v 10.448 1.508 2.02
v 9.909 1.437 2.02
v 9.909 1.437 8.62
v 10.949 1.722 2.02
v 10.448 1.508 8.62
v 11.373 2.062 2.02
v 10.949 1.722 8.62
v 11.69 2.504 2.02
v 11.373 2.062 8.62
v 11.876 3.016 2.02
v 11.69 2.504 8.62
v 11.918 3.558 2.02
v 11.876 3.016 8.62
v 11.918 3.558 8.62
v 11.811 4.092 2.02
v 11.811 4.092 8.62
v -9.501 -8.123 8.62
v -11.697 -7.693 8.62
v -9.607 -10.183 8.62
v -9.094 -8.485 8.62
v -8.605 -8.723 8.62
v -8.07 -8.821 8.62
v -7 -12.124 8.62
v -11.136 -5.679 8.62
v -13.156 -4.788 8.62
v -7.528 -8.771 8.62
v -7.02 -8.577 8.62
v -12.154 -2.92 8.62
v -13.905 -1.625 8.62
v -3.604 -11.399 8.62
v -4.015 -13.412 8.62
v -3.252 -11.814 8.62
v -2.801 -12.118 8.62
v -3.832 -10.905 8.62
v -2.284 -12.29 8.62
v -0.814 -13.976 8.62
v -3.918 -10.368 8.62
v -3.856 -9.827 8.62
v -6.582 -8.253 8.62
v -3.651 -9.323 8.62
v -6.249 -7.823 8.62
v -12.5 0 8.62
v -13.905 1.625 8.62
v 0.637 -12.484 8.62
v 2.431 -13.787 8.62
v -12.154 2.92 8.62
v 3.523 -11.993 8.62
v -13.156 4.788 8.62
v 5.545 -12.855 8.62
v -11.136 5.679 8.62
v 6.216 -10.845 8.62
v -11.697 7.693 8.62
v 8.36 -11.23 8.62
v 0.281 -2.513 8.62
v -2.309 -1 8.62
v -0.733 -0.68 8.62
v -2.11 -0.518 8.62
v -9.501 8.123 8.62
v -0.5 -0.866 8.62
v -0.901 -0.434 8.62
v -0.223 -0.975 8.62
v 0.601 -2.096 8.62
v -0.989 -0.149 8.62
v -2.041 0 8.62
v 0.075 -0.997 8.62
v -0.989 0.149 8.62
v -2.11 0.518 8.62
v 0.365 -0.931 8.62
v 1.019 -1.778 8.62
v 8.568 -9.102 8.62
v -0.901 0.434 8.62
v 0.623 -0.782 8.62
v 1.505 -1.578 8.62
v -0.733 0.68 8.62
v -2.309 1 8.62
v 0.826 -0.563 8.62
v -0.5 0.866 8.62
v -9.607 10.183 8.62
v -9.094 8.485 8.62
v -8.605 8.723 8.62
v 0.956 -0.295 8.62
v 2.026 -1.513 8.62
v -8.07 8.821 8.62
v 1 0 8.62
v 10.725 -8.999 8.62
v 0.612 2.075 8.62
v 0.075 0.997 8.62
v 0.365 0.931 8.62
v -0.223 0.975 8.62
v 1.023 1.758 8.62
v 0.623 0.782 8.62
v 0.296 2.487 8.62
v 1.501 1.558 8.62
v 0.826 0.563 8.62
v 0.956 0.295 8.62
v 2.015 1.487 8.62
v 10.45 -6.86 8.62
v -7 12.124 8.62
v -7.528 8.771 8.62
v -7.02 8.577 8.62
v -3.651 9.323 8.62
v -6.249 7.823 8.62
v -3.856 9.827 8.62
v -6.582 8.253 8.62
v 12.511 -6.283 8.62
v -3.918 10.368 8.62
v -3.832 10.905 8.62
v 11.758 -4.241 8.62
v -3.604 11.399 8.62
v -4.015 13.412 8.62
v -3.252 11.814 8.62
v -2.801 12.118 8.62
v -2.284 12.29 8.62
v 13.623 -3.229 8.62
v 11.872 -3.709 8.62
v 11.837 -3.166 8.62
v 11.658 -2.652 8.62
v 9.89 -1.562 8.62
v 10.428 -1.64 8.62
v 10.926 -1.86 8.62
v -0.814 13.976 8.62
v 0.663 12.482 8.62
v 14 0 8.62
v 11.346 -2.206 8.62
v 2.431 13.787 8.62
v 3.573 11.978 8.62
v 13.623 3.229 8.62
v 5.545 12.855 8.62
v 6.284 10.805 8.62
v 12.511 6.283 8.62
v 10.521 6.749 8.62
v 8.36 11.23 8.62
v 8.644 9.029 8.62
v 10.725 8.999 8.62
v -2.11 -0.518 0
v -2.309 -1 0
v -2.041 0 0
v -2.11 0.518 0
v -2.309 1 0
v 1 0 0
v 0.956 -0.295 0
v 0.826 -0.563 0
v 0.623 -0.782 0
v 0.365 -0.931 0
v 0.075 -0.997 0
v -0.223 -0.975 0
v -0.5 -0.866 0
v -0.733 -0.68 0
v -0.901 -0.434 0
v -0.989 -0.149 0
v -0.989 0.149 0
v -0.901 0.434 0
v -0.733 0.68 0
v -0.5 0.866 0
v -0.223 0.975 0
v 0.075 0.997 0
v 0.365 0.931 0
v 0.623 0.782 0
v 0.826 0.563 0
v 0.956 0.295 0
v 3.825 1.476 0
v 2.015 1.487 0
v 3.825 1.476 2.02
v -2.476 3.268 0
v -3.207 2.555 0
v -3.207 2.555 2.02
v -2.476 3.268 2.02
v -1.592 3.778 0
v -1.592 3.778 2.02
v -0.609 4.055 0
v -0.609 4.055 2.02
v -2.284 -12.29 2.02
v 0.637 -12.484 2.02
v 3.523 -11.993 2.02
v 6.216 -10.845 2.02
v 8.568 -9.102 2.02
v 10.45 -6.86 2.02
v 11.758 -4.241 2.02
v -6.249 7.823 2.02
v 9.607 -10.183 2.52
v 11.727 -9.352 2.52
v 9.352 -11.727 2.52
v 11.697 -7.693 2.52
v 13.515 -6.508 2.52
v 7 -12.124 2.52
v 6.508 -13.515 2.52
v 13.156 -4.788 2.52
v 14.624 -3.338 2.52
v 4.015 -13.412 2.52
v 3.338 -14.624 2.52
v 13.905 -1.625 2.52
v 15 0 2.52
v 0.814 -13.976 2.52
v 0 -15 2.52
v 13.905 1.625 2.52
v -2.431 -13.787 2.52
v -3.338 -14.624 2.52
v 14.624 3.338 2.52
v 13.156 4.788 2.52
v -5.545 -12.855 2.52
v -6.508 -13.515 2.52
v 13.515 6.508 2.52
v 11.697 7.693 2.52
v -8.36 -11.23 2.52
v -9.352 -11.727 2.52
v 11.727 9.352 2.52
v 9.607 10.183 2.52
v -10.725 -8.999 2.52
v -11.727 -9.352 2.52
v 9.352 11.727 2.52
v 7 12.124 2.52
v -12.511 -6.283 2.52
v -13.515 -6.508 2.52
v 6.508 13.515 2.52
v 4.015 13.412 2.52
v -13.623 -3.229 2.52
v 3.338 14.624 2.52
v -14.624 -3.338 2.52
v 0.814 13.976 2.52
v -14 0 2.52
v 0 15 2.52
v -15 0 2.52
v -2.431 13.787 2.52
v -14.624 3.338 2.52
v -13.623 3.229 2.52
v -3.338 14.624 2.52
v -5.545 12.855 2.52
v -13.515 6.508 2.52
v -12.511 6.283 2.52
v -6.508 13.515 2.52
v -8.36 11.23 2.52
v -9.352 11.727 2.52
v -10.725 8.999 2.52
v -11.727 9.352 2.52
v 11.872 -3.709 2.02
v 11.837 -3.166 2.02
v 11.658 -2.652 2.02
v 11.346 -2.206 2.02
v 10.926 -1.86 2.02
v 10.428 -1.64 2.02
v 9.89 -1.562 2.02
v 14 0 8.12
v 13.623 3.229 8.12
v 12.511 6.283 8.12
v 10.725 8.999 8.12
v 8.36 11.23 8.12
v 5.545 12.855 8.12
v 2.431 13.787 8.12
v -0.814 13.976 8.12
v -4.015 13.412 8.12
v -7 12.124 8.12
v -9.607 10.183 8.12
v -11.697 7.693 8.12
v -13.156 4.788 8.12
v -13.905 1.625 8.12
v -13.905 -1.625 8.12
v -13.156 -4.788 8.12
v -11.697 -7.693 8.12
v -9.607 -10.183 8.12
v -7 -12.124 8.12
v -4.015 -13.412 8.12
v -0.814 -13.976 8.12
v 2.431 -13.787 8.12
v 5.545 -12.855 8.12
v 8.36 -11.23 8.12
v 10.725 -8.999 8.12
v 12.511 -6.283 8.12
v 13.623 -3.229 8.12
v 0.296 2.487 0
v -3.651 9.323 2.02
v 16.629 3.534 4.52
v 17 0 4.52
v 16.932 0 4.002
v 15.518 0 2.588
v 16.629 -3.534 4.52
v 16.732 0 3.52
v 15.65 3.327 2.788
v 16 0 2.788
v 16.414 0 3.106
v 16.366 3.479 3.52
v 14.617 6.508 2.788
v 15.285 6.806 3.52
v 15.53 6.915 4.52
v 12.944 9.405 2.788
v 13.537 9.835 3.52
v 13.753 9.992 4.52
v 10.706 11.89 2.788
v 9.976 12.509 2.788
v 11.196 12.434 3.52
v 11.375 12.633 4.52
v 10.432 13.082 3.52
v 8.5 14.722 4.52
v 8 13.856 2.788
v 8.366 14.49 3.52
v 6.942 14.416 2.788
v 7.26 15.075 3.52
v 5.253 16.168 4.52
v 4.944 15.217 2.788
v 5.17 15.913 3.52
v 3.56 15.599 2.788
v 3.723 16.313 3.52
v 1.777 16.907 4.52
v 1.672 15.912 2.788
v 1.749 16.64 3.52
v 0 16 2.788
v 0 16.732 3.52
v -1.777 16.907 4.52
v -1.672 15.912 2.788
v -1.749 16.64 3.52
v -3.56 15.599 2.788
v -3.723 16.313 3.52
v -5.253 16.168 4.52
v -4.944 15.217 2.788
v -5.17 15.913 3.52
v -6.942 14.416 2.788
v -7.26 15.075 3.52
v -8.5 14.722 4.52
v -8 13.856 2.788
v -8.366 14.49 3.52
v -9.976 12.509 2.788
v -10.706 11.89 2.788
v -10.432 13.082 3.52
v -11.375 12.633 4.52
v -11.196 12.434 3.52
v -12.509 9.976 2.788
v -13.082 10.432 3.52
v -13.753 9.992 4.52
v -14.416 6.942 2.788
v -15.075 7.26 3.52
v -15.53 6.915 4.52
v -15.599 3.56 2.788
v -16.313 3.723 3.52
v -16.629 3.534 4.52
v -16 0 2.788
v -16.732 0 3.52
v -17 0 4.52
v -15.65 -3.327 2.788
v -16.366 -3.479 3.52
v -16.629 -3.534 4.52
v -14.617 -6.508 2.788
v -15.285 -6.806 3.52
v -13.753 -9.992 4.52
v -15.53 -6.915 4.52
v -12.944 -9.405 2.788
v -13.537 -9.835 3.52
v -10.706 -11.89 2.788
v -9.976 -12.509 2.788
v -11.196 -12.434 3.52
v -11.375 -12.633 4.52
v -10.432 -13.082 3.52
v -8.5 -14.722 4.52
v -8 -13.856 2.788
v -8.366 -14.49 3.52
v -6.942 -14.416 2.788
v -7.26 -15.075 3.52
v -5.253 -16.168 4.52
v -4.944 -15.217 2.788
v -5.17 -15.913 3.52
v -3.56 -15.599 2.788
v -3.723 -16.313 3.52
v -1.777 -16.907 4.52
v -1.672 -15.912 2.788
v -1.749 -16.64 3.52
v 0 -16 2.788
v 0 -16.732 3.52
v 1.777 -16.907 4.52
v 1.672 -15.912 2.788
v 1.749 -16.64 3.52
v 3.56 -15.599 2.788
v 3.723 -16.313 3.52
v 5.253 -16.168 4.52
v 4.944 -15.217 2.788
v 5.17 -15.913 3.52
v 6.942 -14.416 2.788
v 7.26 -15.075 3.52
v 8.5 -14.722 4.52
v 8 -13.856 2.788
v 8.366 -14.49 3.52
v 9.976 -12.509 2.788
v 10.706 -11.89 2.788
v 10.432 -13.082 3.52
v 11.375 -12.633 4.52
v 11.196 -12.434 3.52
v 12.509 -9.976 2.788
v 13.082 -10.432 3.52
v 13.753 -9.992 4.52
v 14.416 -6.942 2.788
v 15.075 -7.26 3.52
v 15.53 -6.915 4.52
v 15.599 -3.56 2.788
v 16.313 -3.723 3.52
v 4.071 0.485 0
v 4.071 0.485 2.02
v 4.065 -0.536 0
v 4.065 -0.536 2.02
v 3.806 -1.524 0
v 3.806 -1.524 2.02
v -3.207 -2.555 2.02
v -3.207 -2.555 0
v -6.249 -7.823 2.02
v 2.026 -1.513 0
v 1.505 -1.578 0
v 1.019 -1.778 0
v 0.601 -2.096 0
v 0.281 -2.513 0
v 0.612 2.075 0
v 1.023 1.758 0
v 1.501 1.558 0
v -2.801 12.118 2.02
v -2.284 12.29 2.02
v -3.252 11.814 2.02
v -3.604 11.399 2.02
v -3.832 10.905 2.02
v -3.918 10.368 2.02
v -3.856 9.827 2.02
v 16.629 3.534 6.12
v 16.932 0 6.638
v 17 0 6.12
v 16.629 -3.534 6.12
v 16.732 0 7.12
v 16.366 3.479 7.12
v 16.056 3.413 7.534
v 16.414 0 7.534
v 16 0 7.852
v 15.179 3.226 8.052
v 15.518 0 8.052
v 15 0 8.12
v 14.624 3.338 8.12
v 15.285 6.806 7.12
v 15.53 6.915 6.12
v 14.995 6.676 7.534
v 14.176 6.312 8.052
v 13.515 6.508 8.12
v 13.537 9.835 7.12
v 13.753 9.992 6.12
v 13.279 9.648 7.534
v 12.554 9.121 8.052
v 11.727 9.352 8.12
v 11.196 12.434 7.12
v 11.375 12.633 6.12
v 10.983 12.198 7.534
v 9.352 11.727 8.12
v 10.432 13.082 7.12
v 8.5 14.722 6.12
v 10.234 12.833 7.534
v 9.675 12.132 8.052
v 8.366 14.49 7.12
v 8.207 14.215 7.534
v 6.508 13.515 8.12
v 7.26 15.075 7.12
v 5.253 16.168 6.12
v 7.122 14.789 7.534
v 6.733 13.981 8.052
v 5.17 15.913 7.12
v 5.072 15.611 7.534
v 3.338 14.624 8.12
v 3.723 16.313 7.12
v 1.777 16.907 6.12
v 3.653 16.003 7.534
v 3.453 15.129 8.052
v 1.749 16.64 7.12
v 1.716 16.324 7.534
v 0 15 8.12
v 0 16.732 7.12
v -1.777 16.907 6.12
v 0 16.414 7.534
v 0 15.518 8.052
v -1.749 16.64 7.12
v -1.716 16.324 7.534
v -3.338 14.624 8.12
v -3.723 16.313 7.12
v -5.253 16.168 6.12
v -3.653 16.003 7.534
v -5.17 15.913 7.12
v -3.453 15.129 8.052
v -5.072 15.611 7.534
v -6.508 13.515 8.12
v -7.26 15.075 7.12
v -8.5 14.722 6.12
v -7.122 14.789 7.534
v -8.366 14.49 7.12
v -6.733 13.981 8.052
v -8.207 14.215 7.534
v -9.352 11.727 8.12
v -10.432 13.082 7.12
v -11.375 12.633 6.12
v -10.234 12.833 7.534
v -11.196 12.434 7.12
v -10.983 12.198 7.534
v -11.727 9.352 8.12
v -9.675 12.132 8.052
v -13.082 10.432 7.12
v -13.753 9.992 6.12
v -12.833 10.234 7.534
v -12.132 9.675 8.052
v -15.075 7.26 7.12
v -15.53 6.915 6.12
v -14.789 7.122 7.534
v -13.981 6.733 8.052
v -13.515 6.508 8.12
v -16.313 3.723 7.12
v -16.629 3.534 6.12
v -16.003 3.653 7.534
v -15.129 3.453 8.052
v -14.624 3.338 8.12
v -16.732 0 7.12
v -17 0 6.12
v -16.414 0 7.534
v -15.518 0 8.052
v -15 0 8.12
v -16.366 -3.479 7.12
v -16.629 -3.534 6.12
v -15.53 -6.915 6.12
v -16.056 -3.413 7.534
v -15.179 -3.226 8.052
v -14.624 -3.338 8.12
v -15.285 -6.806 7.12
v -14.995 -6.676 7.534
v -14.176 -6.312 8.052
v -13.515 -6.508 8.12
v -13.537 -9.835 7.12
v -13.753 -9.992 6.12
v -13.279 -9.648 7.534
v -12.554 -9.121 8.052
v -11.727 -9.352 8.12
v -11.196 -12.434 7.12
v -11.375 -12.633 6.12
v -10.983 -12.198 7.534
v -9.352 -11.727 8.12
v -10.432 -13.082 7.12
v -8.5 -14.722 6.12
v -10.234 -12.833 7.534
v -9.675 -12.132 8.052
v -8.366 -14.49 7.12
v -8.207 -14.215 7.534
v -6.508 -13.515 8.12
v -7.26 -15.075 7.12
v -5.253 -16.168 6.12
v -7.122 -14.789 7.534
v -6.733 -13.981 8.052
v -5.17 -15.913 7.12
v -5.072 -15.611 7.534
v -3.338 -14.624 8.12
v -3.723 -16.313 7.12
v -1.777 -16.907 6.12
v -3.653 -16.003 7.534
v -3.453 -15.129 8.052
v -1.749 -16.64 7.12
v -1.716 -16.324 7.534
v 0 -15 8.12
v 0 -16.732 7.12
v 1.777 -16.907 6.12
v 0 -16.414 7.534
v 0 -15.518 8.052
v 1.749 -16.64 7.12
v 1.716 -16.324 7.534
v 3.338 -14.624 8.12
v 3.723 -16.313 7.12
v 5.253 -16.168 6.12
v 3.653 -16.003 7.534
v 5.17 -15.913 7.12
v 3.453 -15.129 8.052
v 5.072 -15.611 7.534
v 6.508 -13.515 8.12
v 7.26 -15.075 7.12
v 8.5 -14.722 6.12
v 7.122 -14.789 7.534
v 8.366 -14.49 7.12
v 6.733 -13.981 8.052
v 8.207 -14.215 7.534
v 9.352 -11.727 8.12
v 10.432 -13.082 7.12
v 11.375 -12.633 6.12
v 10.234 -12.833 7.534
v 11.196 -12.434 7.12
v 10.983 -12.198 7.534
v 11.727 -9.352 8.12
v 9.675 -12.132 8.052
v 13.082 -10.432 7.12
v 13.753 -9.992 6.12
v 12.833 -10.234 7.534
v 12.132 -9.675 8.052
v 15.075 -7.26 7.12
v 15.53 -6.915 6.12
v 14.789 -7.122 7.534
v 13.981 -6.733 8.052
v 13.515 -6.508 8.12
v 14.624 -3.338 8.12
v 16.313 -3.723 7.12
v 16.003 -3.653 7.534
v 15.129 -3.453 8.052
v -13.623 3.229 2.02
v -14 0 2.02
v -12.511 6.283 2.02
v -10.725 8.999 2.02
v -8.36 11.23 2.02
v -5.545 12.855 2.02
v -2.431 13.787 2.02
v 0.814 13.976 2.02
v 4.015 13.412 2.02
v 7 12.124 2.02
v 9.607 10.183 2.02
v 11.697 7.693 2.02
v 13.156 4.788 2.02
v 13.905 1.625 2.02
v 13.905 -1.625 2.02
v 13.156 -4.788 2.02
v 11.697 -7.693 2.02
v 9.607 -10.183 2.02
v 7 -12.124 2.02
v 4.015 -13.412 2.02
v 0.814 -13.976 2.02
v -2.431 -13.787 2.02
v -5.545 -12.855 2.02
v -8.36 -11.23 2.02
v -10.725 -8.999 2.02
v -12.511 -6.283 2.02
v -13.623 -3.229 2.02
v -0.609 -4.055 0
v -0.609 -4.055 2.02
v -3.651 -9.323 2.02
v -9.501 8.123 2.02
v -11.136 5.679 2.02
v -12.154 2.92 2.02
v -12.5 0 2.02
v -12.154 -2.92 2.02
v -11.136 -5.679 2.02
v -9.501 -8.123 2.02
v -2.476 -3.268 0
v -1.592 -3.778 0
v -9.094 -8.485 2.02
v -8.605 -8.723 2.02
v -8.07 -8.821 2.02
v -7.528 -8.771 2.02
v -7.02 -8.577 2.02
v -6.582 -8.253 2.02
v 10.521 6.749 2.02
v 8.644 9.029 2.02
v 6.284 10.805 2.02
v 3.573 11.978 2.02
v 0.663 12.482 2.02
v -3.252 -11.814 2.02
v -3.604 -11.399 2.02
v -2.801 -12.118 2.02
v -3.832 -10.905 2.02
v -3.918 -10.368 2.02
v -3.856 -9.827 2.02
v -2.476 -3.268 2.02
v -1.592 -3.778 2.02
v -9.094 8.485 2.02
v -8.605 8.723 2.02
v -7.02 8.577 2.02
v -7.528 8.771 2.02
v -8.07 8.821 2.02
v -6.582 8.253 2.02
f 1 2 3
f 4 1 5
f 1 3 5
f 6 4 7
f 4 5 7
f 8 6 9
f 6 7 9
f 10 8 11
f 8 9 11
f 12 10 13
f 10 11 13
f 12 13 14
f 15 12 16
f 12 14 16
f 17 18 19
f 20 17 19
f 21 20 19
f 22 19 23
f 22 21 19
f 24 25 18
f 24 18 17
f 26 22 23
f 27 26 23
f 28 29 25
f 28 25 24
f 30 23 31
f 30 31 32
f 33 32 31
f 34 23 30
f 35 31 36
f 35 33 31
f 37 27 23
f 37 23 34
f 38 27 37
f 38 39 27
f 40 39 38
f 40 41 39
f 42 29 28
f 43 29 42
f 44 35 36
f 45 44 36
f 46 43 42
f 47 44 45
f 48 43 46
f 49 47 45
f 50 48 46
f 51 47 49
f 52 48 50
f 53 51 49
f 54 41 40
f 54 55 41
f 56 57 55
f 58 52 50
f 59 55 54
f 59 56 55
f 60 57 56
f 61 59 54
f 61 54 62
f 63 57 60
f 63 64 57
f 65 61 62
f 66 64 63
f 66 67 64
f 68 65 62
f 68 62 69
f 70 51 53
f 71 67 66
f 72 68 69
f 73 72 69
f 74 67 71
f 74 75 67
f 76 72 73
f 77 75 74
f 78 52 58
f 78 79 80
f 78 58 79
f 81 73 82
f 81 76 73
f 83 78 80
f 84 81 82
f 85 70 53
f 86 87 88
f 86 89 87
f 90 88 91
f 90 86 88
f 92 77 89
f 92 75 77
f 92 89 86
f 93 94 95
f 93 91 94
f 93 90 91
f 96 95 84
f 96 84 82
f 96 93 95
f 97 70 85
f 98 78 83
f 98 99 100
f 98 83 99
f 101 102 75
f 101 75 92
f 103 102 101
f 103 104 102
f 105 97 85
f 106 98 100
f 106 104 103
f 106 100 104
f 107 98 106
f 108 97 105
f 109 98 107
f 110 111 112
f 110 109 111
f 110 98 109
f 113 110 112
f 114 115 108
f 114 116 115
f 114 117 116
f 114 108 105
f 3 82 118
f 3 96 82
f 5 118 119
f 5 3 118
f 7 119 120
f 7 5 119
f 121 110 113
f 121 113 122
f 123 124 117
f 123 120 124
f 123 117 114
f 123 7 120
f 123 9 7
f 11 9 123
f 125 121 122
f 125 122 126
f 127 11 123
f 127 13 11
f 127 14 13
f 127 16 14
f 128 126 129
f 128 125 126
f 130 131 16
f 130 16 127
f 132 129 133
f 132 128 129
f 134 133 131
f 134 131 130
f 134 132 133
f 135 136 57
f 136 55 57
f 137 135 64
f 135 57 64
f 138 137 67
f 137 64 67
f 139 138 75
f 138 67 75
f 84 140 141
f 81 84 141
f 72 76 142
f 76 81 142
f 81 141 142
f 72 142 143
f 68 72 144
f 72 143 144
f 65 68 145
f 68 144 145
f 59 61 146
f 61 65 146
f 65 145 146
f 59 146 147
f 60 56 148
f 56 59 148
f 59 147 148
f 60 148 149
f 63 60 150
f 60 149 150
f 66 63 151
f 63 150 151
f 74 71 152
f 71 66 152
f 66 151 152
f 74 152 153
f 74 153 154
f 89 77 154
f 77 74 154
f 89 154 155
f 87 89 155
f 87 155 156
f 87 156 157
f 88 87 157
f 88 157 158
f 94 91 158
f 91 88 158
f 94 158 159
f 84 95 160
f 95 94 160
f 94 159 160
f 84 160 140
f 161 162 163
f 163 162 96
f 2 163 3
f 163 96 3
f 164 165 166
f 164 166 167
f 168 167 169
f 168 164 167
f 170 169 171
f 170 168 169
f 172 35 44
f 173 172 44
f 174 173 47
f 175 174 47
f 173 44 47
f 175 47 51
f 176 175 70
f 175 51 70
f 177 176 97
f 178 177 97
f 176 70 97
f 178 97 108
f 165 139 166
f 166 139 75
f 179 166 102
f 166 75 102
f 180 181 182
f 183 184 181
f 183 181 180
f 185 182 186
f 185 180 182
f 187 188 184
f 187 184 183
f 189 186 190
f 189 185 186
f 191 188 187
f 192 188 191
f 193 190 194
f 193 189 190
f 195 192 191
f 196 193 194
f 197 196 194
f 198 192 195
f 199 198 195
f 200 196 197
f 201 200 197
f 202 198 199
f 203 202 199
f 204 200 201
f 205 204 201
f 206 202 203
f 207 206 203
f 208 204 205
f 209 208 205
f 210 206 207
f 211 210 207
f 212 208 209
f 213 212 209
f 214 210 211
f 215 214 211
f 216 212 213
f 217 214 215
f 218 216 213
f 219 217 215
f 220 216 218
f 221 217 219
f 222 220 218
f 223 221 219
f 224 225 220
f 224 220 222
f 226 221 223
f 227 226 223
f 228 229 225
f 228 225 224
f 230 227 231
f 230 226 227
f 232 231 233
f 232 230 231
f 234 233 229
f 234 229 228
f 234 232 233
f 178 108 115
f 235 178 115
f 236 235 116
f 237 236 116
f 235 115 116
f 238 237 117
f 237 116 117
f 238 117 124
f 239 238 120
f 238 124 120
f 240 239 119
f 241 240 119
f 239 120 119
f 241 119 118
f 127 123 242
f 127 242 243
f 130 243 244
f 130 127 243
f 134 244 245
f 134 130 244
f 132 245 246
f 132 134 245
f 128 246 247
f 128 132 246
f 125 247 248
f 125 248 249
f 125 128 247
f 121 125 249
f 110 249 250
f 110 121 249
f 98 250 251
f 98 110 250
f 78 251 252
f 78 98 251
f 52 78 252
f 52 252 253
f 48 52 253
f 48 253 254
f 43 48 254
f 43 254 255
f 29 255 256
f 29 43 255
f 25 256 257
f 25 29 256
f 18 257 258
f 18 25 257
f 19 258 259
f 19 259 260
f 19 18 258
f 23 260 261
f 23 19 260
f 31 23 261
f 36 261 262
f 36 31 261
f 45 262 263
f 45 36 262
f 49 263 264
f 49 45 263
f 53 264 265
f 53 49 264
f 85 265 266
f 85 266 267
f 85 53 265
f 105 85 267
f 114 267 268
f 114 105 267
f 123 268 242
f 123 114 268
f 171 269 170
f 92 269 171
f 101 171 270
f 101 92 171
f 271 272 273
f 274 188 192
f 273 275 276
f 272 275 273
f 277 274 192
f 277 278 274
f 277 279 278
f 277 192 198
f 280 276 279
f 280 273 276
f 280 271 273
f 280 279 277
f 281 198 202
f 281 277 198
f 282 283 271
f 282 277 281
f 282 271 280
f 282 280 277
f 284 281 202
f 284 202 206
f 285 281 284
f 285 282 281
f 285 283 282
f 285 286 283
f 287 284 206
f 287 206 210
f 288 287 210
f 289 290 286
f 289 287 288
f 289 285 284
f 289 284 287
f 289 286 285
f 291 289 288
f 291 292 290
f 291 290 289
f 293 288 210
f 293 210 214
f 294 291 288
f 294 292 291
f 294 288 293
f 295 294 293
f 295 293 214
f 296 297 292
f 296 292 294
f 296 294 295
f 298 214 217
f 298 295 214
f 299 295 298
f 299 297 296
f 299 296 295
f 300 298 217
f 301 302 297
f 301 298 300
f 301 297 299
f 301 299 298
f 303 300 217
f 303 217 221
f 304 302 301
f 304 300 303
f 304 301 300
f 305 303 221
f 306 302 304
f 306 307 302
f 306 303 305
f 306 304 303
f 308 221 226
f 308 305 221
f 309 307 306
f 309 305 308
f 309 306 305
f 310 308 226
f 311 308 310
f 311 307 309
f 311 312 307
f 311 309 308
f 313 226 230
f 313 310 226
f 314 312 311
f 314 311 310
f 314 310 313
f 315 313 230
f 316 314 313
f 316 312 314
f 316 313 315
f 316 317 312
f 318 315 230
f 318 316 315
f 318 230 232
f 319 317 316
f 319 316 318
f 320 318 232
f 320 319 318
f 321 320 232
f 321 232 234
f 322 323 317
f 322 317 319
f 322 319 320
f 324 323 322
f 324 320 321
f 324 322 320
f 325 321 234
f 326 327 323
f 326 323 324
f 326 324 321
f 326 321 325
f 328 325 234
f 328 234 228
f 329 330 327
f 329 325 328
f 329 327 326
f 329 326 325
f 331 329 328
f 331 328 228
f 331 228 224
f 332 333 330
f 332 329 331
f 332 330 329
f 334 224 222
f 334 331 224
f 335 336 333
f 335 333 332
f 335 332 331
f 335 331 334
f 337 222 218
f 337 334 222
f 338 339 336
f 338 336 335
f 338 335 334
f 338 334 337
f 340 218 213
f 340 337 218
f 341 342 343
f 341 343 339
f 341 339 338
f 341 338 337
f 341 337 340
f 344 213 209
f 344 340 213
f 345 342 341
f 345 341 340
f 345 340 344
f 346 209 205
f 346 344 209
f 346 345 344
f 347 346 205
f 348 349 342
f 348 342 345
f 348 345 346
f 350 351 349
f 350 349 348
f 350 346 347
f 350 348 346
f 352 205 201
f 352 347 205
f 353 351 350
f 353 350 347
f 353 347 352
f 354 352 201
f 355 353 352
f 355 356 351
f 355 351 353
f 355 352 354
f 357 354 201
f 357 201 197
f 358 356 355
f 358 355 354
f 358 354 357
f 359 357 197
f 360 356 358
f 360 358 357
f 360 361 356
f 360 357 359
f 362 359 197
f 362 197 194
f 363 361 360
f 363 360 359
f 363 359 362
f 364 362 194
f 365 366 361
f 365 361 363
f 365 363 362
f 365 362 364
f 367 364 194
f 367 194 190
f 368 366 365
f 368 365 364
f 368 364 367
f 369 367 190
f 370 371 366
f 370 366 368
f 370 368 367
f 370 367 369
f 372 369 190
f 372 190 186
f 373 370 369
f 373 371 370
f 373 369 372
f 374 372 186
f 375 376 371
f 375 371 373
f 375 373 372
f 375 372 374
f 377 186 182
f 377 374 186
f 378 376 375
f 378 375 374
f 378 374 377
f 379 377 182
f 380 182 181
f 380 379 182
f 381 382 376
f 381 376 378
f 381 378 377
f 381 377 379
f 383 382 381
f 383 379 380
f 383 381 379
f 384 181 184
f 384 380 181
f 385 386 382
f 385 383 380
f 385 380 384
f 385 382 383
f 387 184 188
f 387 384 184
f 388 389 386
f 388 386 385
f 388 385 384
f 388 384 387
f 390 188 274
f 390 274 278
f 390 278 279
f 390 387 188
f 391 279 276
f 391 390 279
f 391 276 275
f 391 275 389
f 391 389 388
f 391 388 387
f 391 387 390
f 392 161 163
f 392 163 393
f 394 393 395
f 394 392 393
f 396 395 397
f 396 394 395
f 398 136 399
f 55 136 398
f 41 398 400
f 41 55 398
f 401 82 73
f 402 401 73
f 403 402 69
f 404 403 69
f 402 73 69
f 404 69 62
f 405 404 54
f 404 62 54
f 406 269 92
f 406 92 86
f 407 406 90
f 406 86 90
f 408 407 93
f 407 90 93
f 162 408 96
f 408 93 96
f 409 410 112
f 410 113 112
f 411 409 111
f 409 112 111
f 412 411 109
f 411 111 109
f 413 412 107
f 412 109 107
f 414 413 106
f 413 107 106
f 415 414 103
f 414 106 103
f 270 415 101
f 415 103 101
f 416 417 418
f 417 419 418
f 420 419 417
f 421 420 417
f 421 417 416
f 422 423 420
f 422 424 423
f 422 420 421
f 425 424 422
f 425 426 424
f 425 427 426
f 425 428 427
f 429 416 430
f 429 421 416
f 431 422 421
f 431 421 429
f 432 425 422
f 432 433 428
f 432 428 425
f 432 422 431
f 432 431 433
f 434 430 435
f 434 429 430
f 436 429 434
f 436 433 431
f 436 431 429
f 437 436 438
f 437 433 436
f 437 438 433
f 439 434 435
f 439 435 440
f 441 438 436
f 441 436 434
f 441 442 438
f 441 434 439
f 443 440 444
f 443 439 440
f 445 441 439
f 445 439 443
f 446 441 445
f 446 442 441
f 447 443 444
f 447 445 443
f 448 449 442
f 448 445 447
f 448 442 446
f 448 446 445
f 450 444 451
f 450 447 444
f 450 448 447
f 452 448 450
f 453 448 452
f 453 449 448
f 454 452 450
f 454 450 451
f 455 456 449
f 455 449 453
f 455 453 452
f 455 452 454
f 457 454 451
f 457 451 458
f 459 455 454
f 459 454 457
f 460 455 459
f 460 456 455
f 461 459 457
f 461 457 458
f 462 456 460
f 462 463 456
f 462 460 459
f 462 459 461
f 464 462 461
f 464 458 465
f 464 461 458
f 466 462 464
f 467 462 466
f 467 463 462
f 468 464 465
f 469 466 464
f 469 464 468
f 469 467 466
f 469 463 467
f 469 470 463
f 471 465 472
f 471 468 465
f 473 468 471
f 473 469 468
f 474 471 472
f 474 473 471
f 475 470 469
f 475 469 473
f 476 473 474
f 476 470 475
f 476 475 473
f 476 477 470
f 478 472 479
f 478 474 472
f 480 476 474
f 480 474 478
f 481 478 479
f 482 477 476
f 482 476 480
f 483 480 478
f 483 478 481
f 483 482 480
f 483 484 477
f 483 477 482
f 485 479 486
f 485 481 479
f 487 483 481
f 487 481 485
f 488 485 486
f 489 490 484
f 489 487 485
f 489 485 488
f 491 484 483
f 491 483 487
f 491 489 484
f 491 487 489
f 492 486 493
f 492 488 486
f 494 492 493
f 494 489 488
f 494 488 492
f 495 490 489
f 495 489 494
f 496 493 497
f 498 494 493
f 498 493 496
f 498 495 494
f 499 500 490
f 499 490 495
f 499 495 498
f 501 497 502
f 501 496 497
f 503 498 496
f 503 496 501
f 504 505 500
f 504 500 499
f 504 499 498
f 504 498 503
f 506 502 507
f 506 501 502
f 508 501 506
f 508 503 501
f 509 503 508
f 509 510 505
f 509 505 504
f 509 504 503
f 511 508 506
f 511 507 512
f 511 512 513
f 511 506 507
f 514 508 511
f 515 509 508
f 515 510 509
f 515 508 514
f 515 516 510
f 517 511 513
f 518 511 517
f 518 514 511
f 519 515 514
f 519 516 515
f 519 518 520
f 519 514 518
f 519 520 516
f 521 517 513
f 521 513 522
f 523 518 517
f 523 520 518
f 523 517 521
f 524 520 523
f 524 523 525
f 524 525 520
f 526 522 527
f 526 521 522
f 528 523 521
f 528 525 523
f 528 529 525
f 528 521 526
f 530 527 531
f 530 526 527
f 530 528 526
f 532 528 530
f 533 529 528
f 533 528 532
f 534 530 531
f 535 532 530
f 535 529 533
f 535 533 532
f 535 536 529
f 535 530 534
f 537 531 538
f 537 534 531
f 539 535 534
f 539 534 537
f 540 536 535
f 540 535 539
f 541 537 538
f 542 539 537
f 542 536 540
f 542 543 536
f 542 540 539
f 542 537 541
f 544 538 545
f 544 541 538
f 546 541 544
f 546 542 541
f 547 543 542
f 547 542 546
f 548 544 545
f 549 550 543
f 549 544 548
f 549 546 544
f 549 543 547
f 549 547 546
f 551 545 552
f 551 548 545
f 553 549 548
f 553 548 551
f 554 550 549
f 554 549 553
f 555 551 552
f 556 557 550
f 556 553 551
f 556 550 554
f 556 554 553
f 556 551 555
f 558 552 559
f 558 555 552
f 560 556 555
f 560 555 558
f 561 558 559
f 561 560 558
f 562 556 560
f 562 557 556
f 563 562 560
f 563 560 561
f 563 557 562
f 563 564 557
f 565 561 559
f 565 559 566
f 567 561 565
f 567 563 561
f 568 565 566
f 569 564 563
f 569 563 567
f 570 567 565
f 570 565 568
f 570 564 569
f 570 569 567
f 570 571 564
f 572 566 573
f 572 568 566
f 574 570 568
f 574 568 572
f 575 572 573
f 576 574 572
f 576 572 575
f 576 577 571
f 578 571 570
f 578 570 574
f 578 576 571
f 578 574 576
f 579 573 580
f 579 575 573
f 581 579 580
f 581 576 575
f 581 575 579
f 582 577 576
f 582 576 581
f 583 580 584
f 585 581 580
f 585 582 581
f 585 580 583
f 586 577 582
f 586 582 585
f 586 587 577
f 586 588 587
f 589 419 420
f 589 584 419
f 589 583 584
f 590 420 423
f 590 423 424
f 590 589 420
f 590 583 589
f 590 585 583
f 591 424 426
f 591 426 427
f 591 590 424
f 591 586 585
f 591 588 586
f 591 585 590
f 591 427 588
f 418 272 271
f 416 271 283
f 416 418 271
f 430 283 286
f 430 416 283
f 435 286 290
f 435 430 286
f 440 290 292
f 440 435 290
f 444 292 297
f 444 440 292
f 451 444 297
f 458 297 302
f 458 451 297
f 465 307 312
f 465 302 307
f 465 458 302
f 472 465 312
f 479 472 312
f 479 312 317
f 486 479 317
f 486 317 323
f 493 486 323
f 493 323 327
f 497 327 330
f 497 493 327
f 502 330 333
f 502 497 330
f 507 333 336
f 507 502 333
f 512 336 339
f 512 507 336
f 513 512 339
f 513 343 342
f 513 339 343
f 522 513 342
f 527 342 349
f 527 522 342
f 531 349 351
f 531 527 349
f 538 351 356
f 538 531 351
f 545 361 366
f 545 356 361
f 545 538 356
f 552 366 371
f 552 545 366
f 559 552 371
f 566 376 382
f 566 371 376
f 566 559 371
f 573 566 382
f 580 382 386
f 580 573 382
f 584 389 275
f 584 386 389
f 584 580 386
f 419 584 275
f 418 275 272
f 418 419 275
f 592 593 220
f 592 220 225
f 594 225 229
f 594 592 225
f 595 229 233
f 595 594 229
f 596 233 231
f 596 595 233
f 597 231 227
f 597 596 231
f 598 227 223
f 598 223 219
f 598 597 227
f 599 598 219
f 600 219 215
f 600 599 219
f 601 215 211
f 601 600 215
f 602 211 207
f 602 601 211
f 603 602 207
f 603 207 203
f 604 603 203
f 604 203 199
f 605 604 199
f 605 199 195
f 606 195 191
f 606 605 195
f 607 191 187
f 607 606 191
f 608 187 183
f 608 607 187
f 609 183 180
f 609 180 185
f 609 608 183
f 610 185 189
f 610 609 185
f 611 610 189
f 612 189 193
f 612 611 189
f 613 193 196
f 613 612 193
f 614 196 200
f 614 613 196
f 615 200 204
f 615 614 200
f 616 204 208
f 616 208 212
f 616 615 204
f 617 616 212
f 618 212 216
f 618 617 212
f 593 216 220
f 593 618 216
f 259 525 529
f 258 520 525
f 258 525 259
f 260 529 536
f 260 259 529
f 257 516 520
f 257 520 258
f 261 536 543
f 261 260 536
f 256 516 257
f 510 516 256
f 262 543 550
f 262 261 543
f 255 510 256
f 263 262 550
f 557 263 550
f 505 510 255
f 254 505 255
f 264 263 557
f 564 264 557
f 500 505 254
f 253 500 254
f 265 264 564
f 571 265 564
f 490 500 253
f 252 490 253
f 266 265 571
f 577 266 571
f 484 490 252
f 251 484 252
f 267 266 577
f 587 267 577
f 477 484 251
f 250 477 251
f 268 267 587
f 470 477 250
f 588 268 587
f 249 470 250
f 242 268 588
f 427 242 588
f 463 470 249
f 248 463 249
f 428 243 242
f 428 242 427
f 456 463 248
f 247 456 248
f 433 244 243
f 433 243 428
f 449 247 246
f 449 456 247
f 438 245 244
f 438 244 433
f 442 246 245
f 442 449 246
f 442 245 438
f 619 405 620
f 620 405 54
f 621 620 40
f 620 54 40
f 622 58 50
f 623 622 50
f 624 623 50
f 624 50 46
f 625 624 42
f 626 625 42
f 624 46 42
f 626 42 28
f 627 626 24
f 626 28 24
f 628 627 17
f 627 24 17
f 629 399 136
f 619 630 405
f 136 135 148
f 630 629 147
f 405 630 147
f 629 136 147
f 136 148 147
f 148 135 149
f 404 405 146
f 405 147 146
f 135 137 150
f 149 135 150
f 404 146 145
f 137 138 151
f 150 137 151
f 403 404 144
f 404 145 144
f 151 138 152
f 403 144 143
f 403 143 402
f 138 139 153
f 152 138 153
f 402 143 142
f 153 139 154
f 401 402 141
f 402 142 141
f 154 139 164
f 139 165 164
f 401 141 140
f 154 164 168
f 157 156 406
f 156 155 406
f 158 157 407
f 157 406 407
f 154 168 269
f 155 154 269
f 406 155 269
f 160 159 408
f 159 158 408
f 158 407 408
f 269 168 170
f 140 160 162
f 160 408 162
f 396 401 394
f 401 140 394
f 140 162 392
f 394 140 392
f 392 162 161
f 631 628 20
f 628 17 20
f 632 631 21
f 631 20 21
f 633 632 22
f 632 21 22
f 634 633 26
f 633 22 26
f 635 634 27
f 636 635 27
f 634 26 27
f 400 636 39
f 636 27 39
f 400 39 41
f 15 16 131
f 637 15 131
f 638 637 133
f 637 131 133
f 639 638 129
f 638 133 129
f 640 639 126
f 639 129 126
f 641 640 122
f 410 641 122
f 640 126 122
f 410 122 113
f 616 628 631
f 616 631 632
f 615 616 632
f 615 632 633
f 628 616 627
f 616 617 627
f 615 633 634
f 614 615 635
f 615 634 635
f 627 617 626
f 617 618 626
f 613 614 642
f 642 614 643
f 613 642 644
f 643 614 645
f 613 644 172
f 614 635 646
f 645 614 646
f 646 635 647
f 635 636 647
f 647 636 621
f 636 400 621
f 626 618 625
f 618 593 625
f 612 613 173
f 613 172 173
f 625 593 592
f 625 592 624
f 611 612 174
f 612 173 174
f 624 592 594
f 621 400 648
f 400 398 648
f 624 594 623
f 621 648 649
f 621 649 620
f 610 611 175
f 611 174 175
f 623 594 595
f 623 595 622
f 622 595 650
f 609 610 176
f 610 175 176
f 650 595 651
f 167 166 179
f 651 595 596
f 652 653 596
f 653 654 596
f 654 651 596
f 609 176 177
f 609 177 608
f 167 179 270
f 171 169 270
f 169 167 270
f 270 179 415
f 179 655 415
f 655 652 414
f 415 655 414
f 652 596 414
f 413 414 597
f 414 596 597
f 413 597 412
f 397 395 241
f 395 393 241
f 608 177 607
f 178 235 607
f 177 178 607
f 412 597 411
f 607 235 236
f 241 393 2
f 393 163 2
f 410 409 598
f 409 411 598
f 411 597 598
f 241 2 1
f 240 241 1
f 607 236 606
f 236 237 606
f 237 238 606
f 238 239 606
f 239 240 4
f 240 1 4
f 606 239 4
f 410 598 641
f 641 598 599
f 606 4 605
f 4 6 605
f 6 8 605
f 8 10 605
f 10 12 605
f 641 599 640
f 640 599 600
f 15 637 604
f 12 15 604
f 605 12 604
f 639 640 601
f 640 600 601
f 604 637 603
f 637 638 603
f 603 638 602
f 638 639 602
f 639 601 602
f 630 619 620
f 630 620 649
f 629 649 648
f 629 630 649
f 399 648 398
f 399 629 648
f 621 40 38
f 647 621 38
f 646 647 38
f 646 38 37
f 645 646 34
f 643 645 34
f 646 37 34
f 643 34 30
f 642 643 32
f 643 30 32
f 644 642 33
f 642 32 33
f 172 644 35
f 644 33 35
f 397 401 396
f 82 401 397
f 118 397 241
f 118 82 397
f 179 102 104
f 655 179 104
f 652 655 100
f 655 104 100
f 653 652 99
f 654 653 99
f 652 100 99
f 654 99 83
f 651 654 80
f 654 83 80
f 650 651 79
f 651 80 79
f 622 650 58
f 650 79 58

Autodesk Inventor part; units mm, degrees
ref_plane "YZ Plane" through (0, 0, 0) normal (1, 0, 0) x (0, 1, 0)
ref_plane "XZ Plane" through (0, 0, 0) normal (0, 1, 0) x (-1, 0, 0)
ref_plane "XY Plane" through (0, 0, 0) normal (0, 0, 1) x (1, 0, 0)
sketch "스케치1" plane through (0, 0, 0) normal (0, 0, 1) x (1, 0, 0)
  circle A0 centre (0, 0) radius 4.1
  circle A1 centre (0, 0) radius 1 projected
  dimension "d0" = 8.2
extrude "돌출1" add sketch "스케치1" along normal blind 8.62
sketch "스케치2" plane through (0, 0, 8.62) normal (0, 0, 1) x (1, 0, 0)
  circle A0 centre (0, 0) radius 17
  circle A1 centre (0, 0) radius 4.1 projected
  dimension "d3" = 34
extrude "돌출2" add sketch "스케치2" against normal blind 6.6
sketch "스케치3" plane through (0, 0, 8.62) normal (0, 0, 1) x (1, 0, 0)
  point P0 (0, 0)
sketch "스케치4" plane through (0, 0, 8.62) normal (0, 0, 1) x (1, 0, 0)
  circle A0 centre (0, 0) radius 17 projected
  circle A1 centre (0, 0) radius 1 projected
  circle A2 centre (0, 0) radius 14
  dimension "d6" = 3
extrude "돌출3" cut sketch "스케치4" against normal blind 0.5 contours A0
sketch "스케치5" plane through (0, 0, 2.02) normal (0, 0, -1) x (-1, 0, 0)
  circle A0 centre (0, 0) radius 4.1 projected
  circle A1 centre (0, 0) radius 17 projected
  circle A2 centre (0, 0) radius 14 projected
extrude "돌출4" cut sketch "스케치5" against normal blind 0.5 contours A1
fillet "모깎기1" radius 2 2 edges at (-17, 0, 2.52) (-17, 0, 8.12)
sketch "스케치6" plane through (0, 0, 8.62) normal (0, 0, 1) x (1, 0, 0)
  circle A0 centre (0, 0) radius 14 projected
  circle A1 centre (0, 0) radius 1 projected
  circle A2 centre (0, 0) radius 14
  circle A3 centre (0, 0) radius 14 projected
  line L0 (0, 0) -> (1, 0) construction
  line L1 (0, 0) -> (-0.5, -0.866)
  line L2 (2.026, -1.5128) -> (9.8898, -1.5625)
  line L3 (0.866, -1.5) -> (0.8629, -1.5055)
  line L4 (-2.3094, -1) -> (-6.2488, -7.8232)
  line L5 (13.9097, -1.5879) -> (13.9902, -1.5884)
  line L6 (0.296, 2.4873) -> (-3.6507, 9.3232)
  line L7 (-2.3094, 1) -> (-6.2488, 7.8232)
  line L8 (-8.2587, 11.3046) -> (-8.299, 11.3744)
  line L9 (-5.6607, 12.8046) -> (-5.701, 12.8744)
  arc A4 (-2.2841, -12.2895) -> (11.7585, -4.2411) centre (0, 0) ccw
  line L10 (0, 0) -> (1, -0.0063)
  line L11 (0.2813, -2.5128) -> (-3.6507, -9.3232)
  line L12 (-5.6607, -12.8046) -> (-5.701, -12.8744)
  line L13 (0, 0) -> (-0.5, 0.866)
  line L14 (2.0154, 1.4873) -> (9.9088, 1.4374)
  line L15 (13.9286, 1.412) -> (14.0092, 1.4115)
  arc A5 (11.8112, 4.0921) -> (-2.2841, 12.2895) centre (0, 0) ccw
  arc A6 (-9.501, 8.1229) -> (-9.501, -8.1229) centre (0, 0) ccw
  line L16 (0, 0) -> (1, 0) construction
  arc A7 (9.9088, 1.4374) -> (11.8112, 4.0921) centre (9.9214, 3.4374) ccw
  arc A8 (-2.2841, 12.2895) -> (-3.6507, 9.3232) centre (-1.9187, 10.3232) ccw
  arc A9 (0.296, 2.4873) -> (2.0154, 1.4873) centre (2.0281, 3.4873) ccw
  arc A10 (2.026, -1.5128) -> (0.2813, -2.5128) centre (2.0133, -3.5128) ccw
  arc A11 (11.7585, -4.2411) -> (9.8898, -1.5625) centre (9.8772, -3.5625) ccw
  arc A12 (-3.6507, -9.3232) -> (-2.2841, -12.2895) centre (-1.9187, -10.3232) ccw
  arc A13 (-9.501, -8.1229) -> (-6.2488, -7.8232) centre (-7.9808, -6.8232) ccw
  arc A14 (-6.2488, 7.8232) -> (-9.501, 8.1229) centre (-7.9808, 6.8232) ccw
  arc A15 (-2.3094, -1) -> (-2.3094, 1) centre (-4.0415, 0) ccw
  point P0 (12.4189, 1.4215)
  point P1 (12.3999, -1.5784)
  point P2 (-4.9058, -11.4971)
  point P3 (-7.5039, -9.9971)
  point P4 (-7.5039, 9.9971)
  point P5 (-4.9058, 11.4971)
  dimension "d26" = 1.5
  dimension "d28" = 1.5
  dimension "d29" = 2
extrude "돌출5" cut sketch "스케치6" against normal up to next contours L2 A11 A4 A12 L11 A10 | L4 A13 A6 A14 L7 A15 | L6 A8 A5 A7 L14 A9
properties part number "n2_miniWheel"
